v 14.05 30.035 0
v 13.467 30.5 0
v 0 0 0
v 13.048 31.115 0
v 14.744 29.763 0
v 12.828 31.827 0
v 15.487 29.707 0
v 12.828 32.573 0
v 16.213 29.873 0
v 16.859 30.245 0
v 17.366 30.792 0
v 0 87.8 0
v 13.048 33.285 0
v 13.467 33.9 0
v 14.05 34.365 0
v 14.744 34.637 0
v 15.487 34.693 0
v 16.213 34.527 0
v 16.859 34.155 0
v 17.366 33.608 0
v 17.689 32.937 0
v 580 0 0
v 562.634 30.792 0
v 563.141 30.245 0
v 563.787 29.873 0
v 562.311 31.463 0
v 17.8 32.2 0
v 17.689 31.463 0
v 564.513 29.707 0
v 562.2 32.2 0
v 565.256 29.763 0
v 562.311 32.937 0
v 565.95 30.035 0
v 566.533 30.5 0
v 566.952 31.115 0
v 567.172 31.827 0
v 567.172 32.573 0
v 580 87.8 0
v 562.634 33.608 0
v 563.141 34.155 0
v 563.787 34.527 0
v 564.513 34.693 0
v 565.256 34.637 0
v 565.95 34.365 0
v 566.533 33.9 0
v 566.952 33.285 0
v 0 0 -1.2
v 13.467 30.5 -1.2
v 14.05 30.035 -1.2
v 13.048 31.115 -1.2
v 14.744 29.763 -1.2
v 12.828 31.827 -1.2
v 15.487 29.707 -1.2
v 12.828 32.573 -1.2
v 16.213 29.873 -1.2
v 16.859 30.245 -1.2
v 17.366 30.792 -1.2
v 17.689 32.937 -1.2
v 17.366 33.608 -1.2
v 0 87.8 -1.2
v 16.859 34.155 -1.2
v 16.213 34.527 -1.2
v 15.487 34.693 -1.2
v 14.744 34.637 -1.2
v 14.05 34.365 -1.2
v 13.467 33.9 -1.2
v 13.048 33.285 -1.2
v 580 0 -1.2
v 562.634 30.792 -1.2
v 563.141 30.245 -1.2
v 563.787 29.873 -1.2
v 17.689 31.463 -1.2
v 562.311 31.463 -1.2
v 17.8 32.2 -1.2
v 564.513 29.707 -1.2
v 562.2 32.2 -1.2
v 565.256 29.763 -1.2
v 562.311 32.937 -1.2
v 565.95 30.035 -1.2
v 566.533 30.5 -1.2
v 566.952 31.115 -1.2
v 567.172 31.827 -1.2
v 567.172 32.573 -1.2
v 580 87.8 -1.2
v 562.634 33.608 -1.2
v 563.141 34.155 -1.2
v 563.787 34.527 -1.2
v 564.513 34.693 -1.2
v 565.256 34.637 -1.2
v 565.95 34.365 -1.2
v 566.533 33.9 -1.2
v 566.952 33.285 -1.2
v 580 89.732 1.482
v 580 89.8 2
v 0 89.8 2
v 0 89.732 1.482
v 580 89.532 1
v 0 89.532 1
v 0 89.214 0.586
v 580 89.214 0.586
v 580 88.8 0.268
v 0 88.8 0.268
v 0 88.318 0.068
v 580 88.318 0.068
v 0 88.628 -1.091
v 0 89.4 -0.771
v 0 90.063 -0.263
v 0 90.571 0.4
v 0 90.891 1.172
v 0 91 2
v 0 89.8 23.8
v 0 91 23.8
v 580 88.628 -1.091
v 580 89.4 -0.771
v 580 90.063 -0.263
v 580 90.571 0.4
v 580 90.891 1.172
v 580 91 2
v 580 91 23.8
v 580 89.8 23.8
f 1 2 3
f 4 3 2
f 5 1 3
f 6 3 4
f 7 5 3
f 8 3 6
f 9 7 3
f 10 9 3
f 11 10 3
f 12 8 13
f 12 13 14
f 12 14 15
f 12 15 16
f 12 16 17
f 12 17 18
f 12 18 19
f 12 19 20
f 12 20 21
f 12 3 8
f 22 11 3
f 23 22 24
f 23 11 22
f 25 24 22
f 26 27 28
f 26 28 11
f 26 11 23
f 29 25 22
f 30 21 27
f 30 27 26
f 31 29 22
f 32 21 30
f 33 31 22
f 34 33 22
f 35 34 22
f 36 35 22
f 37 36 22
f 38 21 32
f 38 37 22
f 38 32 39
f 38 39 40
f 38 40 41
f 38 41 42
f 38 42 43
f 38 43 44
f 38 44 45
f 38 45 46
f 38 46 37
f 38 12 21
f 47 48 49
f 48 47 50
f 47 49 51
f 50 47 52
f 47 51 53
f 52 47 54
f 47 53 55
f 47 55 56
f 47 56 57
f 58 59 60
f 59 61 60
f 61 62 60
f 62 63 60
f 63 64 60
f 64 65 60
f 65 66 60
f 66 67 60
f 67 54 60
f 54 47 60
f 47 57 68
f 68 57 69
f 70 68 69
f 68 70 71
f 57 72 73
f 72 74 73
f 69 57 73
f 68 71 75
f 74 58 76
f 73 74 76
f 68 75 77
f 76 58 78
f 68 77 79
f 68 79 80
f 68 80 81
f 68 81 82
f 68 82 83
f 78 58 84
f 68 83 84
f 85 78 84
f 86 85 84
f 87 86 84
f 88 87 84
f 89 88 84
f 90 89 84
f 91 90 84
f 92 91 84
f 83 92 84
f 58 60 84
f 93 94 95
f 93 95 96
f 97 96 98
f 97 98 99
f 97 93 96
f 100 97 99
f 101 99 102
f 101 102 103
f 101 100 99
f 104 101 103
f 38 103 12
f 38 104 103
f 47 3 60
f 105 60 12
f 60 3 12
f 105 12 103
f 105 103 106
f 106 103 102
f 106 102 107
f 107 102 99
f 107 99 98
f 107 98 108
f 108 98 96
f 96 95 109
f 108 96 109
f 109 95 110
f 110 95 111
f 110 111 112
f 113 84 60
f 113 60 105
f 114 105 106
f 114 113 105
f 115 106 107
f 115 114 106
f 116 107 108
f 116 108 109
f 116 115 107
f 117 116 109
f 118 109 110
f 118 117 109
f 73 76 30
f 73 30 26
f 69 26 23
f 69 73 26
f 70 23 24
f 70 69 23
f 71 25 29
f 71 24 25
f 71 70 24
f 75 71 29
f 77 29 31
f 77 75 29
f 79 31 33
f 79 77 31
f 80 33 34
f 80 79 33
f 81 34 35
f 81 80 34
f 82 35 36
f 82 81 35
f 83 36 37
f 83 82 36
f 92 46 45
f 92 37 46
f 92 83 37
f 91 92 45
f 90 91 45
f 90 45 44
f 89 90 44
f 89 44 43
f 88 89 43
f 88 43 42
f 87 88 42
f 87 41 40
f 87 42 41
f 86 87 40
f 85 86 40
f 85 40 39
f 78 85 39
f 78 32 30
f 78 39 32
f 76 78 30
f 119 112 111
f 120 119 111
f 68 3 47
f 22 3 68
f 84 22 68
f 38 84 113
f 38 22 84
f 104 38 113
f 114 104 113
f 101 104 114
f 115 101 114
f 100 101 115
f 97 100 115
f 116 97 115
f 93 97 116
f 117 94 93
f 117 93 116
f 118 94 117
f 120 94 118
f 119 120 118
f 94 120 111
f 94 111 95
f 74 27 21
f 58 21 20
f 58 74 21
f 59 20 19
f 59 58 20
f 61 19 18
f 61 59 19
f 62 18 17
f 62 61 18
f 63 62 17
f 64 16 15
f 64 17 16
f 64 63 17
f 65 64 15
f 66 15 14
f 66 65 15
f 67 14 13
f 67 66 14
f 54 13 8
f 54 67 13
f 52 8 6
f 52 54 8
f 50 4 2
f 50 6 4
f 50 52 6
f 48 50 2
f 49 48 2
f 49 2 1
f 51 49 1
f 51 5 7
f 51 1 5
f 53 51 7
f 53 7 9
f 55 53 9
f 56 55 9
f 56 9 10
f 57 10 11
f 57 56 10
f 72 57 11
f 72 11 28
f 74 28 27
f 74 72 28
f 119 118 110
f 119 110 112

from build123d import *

# Parameters (mm, degrees)
SKETCH1_W                    = 580
SKETCH1_H                    = 91
BASE_FLANGE1_DEPTH           = 1.2
EDGE_FLANGE2_STRIP_W         = 8.8
EDGE_FLANGE2_STRIP_H         = 1.2
EDGE_FLANGE2_STRIP_CUT_DEPTH = 580
EDGE_FLANGE2_DEPTH           = 580
CUT_EXTRUDE1_START           = -1.2
CUT_EXTRUDE1_OUTLINE_R       = 2.5
CUT_EXTRUDE1_DEPTH           = 1.2
CUT_EXTRUDE2_DEPTH           = 811.392138245
CUT_EXTRUDE2_DEPTH_BACK      = 811.392138245
SKETCH18_R                   = 2.5


# Read off the part's stored shape, not the designer's step: Cut-Extrude1
# Sheet-metal steps are written as plain solids
with BuildPart() as part:
    # Sketch1 → Base-Flange1 (new body)
    with BuildSketch(Plane.XY):
        with Locations((290, 45.5)):
            Rectangle(SKETCH1_W, SKETCH1_H)
    extrude(amount=-BASE_FLANGE1_DEPTH)

    # Edge-Flange2 strip (across the edge) → Edge-Flange2 strip cut (cut)
    with BuildSketch(Plane(origin=(580, 91, 0), x_dir=(0, -1, 0), z_dir=(-1, 0, 0))):
        with Locations((-1.2, -0.6)):
            Rectangle(EDGE_FLANGE2_STRIP_W, EDGE_FLANGE2_STRIP_H)
    extrude(amount=EDGE_FLANGE2_STRIP_CUT_DEPTH, mode=Mode.SUBTRACT)

    # Edge-Flange2 section (across the edge) → Edge-Flange2 (add)
    with BuildSketch(Plane(origin=(580, 91, 0), x_dir=(0, -1, 0), z_dir=(-1, 0, 0))):
        with BuildLine():
            Line((0, 2), (0, 23.8))
            Line((0, 23.8), (1.2, 23.8))
            Line((1.2, 23.8), (1.2, 2))
            ThreePointArc((1.2, 2), (1.785786438, 0.585786438), (3.2, 0))
            Line((3.2, 0), (3.2, -1.2))
            ThreePointArc((3.2, -1.2), (0.9372583, -0.2627417), (0, 2))
        make_face()
    extrude(amount=EDGE_FLANGE2_DEPTH)

    # Cut-Extrude1 outline → Cut-Extrude1 (cut)
    with BuildSketch(Plane.XY.offset(CUT_EXTRUDE1_START)):
        with Locations((15.3, 32.2)):
            Circle(CUT_EXTRUDE1_OUTLINE_R)
    extrude(amount=CUT_EXTRUDE1_DEPTH, mode=Mode.SUBTRACT)

    # Sketch18 → Cut-Extrude2 (cut, two sides: drawn at the far end of the back side and taken through both)
    with BuildSketch(Plane.XY.offset(-534.818311308).offset(-CUT_EXTRUDE2_DEPTH_BACK)):
        with Locations(Location((15.3, 32.2, 0), (0, 0, 180))):
            Circle(SKETCH18_R)
        with Locations(Location((564.7, 32.2, 0), (0, 0, 180))):
            Circle(SKETCH18_R)
    extrude(amount=CUT_EXTRUDE2_DEPTH + CUT_EXTRUDE2_DEPTH_BACK, mode=Mode.SUBTRACT)


solid = part.part
